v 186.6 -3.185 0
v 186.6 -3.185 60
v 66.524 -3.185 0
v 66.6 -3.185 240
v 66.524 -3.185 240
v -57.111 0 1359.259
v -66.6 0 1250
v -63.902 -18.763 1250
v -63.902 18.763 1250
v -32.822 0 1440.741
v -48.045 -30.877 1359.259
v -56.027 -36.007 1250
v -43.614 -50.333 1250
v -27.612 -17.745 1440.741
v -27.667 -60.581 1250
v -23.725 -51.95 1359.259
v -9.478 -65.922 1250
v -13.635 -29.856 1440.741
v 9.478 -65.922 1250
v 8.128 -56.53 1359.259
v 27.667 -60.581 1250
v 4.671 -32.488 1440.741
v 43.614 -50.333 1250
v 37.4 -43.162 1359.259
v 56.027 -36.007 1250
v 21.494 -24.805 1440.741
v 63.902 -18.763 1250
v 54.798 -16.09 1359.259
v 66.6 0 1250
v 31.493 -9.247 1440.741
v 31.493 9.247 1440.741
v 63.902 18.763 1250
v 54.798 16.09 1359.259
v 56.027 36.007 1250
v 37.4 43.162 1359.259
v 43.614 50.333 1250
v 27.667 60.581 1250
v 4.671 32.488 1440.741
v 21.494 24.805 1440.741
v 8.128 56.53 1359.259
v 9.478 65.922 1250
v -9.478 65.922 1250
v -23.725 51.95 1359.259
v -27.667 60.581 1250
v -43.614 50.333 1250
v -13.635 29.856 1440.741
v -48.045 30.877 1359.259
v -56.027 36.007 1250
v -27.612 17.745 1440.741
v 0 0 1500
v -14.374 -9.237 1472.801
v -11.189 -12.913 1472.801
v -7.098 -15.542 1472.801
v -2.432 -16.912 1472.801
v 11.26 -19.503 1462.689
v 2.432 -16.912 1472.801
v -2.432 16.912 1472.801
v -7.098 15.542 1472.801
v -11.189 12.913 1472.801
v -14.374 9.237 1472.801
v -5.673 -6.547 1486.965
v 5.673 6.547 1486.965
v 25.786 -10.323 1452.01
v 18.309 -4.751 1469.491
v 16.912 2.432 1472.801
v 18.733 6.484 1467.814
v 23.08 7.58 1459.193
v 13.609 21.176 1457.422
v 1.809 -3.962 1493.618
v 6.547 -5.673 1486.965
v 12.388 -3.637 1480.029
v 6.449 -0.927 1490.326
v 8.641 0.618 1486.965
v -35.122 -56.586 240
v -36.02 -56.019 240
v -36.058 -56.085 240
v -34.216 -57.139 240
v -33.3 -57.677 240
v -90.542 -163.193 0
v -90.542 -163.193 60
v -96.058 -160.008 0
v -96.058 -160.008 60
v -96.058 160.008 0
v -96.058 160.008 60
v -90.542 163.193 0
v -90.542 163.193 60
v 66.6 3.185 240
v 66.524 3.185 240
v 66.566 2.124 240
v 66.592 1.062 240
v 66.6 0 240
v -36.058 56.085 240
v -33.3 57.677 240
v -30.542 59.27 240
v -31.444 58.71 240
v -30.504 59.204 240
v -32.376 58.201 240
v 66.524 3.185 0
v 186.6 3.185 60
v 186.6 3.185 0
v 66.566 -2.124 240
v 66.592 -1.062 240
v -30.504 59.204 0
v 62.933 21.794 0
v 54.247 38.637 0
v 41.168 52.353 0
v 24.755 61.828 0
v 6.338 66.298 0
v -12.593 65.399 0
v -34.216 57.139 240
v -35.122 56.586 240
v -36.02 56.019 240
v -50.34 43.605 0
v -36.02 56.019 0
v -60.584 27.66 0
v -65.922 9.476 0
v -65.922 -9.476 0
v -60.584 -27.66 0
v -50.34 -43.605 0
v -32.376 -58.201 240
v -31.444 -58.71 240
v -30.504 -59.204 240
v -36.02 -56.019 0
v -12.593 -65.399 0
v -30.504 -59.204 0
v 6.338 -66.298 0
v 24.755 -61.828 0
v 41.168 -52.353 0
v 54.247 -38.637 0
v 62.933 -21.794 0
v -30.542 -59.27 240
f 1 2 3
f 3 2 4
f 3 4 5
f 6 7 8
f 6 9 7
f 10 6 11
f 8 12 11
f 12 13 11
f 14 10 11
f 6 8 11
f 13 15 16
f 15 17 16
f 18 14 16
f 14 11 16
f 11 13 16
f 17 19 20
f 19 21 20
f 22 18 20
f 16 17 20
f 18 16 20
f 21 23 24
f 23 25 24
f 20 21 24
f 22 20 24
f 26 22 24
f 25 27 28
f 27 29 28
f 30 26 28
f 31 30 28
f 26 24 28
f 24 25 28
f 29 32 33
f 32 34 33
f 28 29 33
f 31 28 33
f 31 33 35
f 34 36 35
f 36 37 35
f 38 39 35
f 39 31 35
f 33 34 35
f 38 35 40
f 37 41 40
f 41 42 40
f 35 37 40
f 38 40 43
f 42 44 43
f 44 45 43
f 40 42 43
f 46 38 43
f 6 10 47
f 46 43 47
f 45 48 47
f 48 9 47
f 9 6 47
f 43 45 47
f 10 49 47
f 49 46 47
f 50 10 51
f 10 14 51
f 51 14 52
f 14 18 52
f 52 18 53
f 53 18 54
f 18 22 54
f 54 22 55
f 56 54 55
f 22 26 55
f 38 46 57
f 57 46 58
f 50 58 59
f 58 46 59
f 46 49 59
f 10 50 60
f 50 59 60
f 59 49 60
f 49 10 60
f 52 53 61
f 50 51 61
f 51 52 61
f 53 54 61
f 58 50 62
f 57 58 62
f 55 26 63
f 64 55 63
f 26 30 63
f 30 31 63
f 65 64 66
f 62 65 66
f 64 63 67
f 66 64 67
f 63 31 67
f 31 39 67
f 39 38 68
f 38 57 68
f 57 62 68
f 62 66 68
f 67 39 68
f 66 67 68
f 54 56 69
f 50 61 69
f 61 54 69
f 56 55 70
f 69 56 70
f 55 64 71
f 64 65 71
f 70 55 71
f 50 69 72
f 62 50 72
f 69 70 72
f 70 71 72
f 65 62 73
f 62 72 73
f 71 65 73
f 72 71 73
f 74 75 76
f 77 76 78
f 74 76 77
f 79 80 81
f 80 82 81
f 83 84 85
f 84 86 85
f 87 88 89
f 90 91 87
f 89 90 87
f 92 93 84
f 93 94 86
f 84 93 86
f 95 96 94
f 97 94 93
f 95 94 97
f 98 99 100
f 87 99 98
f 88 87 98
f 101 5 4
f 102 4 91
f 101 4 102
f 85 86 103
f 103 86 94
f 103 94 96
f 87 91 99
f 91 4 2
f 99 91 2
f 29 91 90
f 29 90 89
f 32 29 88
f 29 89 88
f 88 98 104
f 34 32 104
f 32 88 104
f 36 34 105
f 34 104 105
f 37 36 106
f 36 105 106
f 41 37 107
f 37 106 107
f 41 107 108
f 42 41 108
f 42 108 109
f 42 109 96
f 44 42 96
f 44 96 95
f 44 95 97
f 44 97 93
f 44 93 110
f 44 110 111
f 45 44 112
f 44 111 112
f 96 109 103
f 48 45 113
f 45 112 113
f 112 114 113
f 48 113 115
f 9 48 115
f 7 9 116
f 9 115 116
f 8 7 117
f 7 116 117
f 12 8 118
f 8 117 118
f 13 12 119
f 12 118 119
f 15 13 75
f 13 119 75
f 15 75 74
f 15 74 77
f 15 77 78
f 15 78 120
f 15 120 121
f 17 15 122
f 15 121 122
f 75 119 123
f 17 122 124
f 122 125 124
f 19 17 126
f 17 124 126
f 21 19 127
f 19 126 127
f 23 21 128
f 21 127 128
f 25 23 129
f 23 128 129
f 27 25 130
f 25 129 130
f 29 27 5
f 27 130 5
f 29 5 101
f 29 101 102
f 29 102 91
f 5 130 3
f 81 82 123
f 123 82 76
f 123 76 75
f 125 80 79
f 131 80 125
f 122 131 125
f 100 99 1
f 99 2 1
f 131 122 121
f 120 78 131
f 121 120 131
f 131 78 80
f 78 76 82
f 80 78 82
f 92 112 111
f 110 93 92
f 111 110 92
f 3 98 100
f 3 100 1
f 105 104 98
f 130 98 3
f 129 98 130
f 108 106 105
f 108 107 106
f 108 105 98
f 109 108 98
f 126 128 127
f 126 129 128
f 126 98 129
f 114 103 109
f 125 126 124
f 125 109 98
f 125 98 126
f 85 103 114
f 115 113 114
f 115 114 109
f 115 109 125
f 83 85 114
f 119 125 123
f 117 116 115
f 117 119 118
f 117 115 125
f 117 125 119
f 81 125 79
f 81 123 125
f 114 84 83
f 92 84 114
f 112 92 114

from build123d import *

# Parameters (mm, degrees)
SKETCH_R           = 66.6
PAD_DEPTH          = 1250
PAD001_DEPTH       = 3.185
POLARPATTERN_COUNT = 3


with BuildPart() as part:
    # Sketch → Pad (new body)
    with BuildSketch(Plane.XY):
        Circle(SKETCH_R)
    extrude(amount=PAD_DEPTH)

    # Sketch001 → Revolution (revolve)
    with BuildSketch(Plane.XZ):
        with BuildLine():
            Line((0, 1500), (0, 1250))
            Line((0, 1250), (-66.6, 1250))
            add(Edge.make_bspline(
                [(0, 1500), (-35, 1450), (-66.6, 1375), (-66.6, 1250)],
                knots=[0, 0, 0, 0, 1, 1, 1, 1], degree=3))
        make_face()
    revolve(axis=Axis((0, 0, 0), (0, 0, 1)))

    # Sketch002 → Pad001 (join, symmetric)
    with BuildSketch(Plane.XZ):
        Polygon((66.6, 240), (186.6, 60), (186.6, 0), (66.6, 0), (0, 0), (0, 240), align=None)
    pad001 = extrude(amount=PAD001_DEPTH, both=True)

    # PolarPattern: Pad001 ×3 about axis
    polarpattern_axis = Axis((0, 0, 0), (0, 0, 1))
    for i in range(1, POLARPATTERN_COUNT):
        add(pad001.rotate(polarpattern_axis, i * 360 / POLARPATTERN_COUNT))


solid = part.part
